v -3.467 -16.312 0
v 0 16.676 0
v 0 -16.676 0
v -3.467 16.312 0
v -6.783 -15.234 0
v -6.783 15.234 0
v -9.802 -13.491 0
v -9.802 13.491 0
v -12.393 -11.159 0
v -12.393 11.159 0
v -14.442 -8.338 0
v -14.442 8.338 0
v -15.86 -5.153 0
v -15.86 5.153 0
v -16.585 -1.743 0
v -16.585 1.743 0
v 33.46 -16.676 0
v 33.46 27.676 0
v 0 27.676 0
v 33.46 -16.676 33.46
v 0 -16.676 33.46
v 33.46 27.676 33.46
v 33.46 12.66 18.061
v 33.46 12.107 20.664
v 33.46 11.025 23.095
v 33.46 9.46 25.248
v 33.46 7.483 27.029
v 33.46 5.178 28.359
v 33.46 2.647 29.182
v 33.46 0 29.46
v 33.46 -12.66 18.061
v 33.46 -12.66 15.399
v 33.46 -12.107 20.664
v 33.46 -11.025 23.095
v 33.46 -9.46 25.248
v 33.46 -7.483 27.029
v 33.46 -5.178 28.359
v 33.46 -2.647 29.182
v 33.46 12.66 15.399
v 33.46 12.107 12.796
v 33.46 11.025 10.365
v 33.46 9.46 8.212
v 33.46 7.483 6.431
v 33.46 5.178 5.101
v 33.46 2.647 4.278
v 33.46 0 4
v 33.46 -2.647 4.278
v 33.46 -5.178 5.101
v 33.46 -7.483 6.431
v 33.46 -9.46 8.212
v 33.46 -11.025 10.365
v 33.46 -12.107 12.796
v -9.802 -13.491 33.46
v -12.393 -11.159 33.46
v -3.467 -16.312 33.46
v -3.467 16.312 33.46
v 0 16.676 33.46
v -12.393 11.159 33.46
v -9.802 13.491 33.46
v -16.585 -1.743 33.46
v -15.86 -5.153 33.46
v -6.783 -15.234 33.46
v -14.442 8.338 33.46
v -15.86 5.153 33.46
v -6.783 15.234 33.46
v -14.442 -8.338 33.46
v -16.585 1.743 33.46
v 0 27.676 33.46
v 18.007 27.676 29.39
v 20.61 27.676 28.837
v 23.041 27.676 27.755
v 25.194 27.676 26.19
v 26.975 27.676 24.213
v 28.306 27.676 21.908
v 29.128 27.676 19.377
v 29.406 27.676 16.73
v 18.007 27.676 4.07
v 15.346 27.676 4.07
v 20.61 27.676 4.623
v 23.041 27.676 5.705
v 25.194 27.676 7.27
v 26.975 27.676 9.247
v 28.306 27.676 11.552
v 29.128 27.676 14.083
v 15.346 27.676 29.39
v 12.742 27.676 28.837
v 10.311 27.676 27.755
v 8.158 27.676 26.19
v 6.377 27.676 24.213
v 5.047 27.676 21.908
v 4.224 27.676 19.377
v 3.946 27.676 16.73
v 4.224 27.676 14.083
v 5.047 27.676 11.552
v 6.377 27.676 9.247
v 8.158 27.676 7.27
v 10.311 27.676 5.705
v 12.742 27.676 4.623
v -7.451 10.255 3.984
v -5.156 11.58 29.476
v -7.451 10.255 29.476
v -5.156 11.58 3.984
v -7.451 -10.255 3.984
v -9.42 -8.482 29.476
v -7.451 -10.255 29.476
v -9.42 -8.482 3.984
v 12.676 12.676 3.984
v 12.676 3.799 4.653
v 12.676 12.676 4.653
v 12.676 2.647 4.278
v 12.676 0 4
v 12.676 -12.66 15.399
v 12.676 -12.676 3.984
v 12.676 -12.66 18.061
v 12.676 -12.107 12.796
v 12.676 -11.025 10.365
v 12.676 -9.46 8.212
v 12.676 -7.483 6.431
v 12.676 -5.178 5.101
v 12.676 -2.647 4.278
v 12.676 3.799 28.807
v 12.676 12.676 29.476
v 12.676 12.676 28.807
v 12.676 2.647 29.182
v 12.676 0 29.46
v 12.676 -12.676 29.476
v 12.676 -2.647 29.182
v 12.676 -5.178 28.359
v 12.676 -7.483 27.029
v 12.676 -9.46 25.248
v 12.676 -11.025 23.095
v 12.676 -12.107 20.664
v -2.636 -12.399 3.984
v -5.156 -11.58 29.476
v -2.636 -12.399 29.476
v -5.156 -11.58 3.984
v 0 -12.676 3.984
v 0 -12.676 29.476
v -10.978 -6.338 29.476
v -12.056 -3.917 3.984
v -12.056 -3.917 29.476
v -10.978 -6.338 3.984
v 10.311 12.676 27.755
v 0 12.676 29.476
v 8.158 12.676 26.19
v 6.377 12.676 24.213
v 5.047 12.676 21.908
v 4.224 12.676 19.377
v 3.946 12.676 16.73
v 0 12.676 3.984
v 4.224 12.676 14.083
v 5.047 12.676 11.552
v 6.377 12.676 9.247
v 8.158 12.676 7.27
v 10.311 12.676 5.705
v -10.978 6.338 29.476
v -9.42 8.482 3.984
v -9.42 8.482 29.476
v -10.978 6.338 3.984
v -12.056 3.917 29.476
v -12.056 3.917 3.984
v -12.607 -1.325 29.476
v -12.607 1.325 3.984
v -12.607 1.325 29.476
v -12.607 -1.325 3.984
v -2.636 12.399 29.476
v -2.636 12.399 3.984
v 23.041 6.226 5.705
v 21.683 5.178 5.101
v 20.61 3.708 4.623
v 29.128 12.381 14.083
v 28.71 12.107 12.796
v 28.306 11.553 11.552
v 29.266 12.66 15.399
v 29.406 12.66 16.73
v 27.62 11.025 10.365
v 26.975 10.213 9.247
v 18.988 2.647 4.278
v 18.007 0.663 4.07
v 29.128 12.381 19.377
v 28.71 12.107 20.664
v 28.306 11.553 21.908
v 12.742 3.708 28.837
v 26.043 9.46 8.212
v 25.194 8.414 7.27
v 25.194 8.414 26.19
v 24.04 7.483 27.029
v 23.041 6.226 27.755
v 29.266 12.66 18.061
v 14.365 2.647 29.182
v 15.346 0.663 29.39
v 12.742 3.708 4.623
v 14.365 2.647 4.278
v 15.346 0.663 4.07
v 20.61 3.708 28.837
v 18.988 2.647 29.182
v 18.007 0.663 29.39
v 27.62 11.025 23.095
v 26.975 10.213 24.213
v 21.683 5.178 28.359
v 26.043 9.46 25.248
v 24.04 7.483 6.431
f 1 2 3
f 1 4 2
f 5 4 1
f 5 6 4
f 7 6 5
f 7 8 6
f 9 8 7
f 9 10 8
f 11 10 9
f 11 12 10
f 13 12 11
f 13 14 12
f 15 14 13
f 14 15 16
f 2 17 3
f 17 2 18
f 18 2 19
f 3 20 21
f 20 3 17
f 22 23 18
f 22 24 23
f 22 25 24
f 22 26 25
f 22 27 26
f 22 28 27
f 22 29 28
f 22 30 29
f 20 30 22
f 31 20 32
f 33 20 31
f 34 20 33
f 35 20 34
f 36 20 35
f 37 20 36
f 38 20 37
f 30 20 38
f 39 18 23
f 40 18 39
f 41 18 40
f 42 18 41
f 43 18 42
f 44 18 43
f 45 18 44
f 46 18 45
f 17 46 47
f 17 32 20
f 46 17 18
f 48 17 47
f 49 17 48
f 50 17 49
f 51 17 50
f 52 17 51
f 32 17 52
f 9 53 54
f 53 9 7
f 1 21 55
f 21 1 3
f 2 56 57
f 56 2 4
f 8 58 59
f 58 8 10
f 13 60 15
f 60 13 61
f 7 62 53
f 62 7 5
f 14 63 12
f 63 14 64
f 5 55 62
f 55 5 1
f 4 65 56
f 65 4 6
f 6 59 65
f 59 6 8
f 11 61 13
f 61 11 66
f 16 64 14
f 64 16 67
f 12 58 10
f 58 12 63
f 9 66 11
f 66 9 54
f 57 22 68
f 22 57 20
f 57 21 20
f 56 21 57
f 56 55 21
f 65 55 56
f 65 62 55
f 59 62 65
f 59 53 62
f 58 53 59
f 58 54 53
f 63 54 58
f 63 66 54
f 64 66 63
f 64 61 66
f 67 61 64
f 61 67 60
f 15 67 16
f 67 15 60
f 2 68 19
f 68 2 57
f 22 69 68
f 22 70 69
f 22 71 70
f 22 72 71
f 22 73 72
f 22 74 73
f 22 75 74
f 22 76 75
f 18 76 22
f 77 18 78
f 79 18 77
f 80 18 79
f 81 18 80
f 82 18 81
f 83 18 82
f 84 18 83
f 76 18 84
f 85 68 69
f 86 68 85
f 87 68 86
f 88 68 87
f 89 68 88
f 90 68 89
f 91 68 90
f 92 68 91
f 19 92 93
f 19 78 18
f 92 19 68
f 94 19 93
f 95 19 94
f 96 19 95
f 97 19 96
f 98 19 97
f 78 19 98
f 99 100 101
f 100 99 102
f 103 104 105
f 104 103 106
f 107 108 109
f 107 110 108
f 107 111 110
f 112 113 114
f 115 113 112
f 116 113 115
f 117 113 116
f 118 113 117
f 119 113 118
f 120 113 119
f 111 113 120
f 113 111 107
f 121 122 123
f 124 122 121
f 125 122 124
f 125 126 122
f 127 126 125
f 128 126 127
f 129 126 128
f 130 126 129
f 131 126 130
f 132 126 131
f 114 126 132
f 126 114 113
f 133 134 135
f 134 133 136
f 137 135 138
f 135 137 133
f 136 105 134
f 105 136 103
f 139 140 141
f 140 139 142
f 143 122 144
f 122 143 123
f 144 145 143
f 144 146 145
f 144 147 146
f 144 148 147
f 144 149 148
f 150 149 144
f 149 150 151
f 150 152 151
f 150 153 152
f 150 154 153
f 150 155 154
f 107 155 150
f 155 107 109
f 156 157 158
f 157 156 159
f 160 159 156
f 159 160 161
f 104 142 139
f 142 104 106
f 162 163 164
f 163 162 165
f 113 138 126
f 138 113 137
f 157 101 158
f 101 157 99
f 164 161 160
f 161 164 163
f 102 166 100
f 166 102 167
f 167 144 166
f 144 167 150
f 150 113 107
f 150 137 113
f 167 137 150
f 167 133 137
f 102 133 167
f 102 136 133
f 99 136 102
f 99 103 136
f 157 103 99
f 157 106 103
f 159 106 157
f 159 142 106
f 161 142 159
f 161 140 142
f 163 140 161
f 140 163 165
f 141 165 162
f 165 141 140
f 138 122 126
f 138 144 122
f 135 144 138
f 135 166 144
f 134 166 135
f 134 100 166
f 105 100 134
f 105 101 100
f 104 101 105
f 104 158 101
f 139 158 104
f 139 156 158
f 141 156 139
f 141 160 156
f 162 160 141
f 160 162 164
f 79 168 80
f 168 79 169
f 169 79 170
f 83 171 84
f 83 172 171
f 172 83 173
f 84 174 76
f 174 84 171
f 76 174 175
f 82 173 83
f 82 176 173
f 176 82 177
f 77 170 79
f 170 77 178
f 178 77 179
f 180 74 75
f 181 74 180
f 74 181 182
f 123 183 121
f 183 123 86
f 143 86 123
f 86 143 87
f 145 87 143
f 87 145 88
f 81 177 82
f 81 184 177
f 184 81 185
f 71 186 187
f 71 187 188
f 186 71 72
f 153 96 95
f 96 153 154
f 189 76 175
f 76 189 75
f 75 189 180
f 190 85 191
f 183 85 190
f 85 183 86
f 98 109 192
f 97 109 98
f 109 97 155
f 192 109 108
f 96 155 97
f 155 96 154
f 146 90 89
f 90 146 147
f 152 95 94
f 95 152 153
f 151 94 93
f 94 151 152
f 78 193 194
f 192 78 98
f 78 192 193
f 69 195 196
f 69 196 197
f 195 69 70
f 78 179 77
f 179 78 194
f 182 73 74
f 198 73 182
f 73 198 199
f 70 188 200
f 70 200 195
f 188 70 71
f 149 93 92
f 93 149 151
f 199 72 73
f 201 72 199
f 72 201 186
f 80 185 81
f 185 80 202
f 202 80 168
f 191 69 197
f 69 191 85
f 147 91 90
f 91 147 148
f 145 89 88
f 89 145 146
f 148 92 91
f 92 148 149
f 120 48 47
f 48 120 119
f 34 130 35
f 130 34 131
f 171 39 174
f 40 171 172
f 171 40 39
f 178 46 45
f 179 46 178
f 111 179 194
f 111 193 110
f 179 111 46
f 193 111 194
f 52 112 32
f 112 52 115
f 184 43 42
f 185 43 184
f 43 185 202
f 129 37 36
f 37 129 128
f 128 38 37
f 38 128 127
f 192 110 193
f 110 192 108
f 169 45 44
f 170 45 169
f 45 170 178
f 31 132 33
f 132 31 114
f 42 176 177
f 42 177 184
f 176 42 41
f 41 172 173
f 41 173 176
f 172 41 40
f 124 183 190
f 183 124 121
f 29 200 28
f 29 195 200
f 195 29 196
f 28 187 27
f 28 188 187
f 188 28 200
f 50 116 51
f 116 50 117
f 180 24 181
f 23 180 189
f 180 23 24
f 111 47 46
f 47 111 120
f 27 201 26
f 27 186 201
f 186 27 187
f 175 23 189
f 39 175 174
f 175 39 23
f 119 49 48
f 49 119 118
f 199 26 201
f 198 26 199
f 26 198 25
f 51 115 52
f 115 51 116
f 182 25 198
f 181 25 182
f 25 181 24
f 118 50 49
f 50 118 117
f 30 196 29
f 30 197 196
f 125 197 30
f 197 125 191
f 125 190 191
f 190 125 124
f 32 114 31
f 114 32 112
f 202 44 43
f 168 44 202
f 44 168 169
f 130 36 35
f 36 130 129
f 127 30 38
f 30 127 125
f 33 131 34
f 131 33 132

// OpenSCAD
include <mk3.scad>

body_height = (drain_pipe_or+wt)*2;
// body_height = thickness;
sprocket_r = bead_chain_r+bead_r;
// This is the length of the sleve/socket into which the drain pipe sockets.
drain_socket_x = 15;
bead_chain_tube_socket_x = 6;



module printable() {
    difference () {
        union() {
            hull() {
                // This little 90 rotation of the cylinder is so the facets land on the y axis.
                rotate([0,0,90]) cylinder(r=sprocket_r+wt,h=body_height);
                translate([sprocket_r,-(sprocket_r+wt),0])
                    cube([(drain_pipe_or+wt)*2-sprocket_r, (sprocket_r+wt)*2, body_height]);
            }
            translate([0,sprocket_r+wt,0]) cube([(drain_pipe_or+wt)*2, drain_socket_x-wt, body_height]);
            // translate([0,-(drain_pipe_or+wt),0]) #cube([(drain_pipe_or+wt)*2, (sprocket_r+wt)*2, body_height]);
        }
        // This is the cutout for the inside of the body
        translate([0,0,-zff+wt]) hull() {
            // This little 90 rotation of the cylinder is so the facets land on the y axis.
            rotate([0,0,90]) cylinder(r=sprocket_r,h=body_height+zff*2-2*wt);
            translate([sprocket_r,0,(body_height+zff*2-2*wt)/2])
                translate([-0.5,0,0]) cube([1, (sprocket_r)*2, body_height+zff*2-2*wt],center=true);
        }
        // translate([-(bead_chain_r+bead_r+wt)-drain_protrusion,0,0]) cylinder(r=shaft_r,h=body_height, $fn=32);

        translate([sprocket_r+wt,0,body_height/2]) rotate([-90,0,0]) cylinder(r=drain_pipe_or, h=100);
        translate([sprocket_r-1,0,body_height/2]) rotate([0,90,0]) cylinder(r=drain_pipe_or, h=100);
    }
}

!printable();
